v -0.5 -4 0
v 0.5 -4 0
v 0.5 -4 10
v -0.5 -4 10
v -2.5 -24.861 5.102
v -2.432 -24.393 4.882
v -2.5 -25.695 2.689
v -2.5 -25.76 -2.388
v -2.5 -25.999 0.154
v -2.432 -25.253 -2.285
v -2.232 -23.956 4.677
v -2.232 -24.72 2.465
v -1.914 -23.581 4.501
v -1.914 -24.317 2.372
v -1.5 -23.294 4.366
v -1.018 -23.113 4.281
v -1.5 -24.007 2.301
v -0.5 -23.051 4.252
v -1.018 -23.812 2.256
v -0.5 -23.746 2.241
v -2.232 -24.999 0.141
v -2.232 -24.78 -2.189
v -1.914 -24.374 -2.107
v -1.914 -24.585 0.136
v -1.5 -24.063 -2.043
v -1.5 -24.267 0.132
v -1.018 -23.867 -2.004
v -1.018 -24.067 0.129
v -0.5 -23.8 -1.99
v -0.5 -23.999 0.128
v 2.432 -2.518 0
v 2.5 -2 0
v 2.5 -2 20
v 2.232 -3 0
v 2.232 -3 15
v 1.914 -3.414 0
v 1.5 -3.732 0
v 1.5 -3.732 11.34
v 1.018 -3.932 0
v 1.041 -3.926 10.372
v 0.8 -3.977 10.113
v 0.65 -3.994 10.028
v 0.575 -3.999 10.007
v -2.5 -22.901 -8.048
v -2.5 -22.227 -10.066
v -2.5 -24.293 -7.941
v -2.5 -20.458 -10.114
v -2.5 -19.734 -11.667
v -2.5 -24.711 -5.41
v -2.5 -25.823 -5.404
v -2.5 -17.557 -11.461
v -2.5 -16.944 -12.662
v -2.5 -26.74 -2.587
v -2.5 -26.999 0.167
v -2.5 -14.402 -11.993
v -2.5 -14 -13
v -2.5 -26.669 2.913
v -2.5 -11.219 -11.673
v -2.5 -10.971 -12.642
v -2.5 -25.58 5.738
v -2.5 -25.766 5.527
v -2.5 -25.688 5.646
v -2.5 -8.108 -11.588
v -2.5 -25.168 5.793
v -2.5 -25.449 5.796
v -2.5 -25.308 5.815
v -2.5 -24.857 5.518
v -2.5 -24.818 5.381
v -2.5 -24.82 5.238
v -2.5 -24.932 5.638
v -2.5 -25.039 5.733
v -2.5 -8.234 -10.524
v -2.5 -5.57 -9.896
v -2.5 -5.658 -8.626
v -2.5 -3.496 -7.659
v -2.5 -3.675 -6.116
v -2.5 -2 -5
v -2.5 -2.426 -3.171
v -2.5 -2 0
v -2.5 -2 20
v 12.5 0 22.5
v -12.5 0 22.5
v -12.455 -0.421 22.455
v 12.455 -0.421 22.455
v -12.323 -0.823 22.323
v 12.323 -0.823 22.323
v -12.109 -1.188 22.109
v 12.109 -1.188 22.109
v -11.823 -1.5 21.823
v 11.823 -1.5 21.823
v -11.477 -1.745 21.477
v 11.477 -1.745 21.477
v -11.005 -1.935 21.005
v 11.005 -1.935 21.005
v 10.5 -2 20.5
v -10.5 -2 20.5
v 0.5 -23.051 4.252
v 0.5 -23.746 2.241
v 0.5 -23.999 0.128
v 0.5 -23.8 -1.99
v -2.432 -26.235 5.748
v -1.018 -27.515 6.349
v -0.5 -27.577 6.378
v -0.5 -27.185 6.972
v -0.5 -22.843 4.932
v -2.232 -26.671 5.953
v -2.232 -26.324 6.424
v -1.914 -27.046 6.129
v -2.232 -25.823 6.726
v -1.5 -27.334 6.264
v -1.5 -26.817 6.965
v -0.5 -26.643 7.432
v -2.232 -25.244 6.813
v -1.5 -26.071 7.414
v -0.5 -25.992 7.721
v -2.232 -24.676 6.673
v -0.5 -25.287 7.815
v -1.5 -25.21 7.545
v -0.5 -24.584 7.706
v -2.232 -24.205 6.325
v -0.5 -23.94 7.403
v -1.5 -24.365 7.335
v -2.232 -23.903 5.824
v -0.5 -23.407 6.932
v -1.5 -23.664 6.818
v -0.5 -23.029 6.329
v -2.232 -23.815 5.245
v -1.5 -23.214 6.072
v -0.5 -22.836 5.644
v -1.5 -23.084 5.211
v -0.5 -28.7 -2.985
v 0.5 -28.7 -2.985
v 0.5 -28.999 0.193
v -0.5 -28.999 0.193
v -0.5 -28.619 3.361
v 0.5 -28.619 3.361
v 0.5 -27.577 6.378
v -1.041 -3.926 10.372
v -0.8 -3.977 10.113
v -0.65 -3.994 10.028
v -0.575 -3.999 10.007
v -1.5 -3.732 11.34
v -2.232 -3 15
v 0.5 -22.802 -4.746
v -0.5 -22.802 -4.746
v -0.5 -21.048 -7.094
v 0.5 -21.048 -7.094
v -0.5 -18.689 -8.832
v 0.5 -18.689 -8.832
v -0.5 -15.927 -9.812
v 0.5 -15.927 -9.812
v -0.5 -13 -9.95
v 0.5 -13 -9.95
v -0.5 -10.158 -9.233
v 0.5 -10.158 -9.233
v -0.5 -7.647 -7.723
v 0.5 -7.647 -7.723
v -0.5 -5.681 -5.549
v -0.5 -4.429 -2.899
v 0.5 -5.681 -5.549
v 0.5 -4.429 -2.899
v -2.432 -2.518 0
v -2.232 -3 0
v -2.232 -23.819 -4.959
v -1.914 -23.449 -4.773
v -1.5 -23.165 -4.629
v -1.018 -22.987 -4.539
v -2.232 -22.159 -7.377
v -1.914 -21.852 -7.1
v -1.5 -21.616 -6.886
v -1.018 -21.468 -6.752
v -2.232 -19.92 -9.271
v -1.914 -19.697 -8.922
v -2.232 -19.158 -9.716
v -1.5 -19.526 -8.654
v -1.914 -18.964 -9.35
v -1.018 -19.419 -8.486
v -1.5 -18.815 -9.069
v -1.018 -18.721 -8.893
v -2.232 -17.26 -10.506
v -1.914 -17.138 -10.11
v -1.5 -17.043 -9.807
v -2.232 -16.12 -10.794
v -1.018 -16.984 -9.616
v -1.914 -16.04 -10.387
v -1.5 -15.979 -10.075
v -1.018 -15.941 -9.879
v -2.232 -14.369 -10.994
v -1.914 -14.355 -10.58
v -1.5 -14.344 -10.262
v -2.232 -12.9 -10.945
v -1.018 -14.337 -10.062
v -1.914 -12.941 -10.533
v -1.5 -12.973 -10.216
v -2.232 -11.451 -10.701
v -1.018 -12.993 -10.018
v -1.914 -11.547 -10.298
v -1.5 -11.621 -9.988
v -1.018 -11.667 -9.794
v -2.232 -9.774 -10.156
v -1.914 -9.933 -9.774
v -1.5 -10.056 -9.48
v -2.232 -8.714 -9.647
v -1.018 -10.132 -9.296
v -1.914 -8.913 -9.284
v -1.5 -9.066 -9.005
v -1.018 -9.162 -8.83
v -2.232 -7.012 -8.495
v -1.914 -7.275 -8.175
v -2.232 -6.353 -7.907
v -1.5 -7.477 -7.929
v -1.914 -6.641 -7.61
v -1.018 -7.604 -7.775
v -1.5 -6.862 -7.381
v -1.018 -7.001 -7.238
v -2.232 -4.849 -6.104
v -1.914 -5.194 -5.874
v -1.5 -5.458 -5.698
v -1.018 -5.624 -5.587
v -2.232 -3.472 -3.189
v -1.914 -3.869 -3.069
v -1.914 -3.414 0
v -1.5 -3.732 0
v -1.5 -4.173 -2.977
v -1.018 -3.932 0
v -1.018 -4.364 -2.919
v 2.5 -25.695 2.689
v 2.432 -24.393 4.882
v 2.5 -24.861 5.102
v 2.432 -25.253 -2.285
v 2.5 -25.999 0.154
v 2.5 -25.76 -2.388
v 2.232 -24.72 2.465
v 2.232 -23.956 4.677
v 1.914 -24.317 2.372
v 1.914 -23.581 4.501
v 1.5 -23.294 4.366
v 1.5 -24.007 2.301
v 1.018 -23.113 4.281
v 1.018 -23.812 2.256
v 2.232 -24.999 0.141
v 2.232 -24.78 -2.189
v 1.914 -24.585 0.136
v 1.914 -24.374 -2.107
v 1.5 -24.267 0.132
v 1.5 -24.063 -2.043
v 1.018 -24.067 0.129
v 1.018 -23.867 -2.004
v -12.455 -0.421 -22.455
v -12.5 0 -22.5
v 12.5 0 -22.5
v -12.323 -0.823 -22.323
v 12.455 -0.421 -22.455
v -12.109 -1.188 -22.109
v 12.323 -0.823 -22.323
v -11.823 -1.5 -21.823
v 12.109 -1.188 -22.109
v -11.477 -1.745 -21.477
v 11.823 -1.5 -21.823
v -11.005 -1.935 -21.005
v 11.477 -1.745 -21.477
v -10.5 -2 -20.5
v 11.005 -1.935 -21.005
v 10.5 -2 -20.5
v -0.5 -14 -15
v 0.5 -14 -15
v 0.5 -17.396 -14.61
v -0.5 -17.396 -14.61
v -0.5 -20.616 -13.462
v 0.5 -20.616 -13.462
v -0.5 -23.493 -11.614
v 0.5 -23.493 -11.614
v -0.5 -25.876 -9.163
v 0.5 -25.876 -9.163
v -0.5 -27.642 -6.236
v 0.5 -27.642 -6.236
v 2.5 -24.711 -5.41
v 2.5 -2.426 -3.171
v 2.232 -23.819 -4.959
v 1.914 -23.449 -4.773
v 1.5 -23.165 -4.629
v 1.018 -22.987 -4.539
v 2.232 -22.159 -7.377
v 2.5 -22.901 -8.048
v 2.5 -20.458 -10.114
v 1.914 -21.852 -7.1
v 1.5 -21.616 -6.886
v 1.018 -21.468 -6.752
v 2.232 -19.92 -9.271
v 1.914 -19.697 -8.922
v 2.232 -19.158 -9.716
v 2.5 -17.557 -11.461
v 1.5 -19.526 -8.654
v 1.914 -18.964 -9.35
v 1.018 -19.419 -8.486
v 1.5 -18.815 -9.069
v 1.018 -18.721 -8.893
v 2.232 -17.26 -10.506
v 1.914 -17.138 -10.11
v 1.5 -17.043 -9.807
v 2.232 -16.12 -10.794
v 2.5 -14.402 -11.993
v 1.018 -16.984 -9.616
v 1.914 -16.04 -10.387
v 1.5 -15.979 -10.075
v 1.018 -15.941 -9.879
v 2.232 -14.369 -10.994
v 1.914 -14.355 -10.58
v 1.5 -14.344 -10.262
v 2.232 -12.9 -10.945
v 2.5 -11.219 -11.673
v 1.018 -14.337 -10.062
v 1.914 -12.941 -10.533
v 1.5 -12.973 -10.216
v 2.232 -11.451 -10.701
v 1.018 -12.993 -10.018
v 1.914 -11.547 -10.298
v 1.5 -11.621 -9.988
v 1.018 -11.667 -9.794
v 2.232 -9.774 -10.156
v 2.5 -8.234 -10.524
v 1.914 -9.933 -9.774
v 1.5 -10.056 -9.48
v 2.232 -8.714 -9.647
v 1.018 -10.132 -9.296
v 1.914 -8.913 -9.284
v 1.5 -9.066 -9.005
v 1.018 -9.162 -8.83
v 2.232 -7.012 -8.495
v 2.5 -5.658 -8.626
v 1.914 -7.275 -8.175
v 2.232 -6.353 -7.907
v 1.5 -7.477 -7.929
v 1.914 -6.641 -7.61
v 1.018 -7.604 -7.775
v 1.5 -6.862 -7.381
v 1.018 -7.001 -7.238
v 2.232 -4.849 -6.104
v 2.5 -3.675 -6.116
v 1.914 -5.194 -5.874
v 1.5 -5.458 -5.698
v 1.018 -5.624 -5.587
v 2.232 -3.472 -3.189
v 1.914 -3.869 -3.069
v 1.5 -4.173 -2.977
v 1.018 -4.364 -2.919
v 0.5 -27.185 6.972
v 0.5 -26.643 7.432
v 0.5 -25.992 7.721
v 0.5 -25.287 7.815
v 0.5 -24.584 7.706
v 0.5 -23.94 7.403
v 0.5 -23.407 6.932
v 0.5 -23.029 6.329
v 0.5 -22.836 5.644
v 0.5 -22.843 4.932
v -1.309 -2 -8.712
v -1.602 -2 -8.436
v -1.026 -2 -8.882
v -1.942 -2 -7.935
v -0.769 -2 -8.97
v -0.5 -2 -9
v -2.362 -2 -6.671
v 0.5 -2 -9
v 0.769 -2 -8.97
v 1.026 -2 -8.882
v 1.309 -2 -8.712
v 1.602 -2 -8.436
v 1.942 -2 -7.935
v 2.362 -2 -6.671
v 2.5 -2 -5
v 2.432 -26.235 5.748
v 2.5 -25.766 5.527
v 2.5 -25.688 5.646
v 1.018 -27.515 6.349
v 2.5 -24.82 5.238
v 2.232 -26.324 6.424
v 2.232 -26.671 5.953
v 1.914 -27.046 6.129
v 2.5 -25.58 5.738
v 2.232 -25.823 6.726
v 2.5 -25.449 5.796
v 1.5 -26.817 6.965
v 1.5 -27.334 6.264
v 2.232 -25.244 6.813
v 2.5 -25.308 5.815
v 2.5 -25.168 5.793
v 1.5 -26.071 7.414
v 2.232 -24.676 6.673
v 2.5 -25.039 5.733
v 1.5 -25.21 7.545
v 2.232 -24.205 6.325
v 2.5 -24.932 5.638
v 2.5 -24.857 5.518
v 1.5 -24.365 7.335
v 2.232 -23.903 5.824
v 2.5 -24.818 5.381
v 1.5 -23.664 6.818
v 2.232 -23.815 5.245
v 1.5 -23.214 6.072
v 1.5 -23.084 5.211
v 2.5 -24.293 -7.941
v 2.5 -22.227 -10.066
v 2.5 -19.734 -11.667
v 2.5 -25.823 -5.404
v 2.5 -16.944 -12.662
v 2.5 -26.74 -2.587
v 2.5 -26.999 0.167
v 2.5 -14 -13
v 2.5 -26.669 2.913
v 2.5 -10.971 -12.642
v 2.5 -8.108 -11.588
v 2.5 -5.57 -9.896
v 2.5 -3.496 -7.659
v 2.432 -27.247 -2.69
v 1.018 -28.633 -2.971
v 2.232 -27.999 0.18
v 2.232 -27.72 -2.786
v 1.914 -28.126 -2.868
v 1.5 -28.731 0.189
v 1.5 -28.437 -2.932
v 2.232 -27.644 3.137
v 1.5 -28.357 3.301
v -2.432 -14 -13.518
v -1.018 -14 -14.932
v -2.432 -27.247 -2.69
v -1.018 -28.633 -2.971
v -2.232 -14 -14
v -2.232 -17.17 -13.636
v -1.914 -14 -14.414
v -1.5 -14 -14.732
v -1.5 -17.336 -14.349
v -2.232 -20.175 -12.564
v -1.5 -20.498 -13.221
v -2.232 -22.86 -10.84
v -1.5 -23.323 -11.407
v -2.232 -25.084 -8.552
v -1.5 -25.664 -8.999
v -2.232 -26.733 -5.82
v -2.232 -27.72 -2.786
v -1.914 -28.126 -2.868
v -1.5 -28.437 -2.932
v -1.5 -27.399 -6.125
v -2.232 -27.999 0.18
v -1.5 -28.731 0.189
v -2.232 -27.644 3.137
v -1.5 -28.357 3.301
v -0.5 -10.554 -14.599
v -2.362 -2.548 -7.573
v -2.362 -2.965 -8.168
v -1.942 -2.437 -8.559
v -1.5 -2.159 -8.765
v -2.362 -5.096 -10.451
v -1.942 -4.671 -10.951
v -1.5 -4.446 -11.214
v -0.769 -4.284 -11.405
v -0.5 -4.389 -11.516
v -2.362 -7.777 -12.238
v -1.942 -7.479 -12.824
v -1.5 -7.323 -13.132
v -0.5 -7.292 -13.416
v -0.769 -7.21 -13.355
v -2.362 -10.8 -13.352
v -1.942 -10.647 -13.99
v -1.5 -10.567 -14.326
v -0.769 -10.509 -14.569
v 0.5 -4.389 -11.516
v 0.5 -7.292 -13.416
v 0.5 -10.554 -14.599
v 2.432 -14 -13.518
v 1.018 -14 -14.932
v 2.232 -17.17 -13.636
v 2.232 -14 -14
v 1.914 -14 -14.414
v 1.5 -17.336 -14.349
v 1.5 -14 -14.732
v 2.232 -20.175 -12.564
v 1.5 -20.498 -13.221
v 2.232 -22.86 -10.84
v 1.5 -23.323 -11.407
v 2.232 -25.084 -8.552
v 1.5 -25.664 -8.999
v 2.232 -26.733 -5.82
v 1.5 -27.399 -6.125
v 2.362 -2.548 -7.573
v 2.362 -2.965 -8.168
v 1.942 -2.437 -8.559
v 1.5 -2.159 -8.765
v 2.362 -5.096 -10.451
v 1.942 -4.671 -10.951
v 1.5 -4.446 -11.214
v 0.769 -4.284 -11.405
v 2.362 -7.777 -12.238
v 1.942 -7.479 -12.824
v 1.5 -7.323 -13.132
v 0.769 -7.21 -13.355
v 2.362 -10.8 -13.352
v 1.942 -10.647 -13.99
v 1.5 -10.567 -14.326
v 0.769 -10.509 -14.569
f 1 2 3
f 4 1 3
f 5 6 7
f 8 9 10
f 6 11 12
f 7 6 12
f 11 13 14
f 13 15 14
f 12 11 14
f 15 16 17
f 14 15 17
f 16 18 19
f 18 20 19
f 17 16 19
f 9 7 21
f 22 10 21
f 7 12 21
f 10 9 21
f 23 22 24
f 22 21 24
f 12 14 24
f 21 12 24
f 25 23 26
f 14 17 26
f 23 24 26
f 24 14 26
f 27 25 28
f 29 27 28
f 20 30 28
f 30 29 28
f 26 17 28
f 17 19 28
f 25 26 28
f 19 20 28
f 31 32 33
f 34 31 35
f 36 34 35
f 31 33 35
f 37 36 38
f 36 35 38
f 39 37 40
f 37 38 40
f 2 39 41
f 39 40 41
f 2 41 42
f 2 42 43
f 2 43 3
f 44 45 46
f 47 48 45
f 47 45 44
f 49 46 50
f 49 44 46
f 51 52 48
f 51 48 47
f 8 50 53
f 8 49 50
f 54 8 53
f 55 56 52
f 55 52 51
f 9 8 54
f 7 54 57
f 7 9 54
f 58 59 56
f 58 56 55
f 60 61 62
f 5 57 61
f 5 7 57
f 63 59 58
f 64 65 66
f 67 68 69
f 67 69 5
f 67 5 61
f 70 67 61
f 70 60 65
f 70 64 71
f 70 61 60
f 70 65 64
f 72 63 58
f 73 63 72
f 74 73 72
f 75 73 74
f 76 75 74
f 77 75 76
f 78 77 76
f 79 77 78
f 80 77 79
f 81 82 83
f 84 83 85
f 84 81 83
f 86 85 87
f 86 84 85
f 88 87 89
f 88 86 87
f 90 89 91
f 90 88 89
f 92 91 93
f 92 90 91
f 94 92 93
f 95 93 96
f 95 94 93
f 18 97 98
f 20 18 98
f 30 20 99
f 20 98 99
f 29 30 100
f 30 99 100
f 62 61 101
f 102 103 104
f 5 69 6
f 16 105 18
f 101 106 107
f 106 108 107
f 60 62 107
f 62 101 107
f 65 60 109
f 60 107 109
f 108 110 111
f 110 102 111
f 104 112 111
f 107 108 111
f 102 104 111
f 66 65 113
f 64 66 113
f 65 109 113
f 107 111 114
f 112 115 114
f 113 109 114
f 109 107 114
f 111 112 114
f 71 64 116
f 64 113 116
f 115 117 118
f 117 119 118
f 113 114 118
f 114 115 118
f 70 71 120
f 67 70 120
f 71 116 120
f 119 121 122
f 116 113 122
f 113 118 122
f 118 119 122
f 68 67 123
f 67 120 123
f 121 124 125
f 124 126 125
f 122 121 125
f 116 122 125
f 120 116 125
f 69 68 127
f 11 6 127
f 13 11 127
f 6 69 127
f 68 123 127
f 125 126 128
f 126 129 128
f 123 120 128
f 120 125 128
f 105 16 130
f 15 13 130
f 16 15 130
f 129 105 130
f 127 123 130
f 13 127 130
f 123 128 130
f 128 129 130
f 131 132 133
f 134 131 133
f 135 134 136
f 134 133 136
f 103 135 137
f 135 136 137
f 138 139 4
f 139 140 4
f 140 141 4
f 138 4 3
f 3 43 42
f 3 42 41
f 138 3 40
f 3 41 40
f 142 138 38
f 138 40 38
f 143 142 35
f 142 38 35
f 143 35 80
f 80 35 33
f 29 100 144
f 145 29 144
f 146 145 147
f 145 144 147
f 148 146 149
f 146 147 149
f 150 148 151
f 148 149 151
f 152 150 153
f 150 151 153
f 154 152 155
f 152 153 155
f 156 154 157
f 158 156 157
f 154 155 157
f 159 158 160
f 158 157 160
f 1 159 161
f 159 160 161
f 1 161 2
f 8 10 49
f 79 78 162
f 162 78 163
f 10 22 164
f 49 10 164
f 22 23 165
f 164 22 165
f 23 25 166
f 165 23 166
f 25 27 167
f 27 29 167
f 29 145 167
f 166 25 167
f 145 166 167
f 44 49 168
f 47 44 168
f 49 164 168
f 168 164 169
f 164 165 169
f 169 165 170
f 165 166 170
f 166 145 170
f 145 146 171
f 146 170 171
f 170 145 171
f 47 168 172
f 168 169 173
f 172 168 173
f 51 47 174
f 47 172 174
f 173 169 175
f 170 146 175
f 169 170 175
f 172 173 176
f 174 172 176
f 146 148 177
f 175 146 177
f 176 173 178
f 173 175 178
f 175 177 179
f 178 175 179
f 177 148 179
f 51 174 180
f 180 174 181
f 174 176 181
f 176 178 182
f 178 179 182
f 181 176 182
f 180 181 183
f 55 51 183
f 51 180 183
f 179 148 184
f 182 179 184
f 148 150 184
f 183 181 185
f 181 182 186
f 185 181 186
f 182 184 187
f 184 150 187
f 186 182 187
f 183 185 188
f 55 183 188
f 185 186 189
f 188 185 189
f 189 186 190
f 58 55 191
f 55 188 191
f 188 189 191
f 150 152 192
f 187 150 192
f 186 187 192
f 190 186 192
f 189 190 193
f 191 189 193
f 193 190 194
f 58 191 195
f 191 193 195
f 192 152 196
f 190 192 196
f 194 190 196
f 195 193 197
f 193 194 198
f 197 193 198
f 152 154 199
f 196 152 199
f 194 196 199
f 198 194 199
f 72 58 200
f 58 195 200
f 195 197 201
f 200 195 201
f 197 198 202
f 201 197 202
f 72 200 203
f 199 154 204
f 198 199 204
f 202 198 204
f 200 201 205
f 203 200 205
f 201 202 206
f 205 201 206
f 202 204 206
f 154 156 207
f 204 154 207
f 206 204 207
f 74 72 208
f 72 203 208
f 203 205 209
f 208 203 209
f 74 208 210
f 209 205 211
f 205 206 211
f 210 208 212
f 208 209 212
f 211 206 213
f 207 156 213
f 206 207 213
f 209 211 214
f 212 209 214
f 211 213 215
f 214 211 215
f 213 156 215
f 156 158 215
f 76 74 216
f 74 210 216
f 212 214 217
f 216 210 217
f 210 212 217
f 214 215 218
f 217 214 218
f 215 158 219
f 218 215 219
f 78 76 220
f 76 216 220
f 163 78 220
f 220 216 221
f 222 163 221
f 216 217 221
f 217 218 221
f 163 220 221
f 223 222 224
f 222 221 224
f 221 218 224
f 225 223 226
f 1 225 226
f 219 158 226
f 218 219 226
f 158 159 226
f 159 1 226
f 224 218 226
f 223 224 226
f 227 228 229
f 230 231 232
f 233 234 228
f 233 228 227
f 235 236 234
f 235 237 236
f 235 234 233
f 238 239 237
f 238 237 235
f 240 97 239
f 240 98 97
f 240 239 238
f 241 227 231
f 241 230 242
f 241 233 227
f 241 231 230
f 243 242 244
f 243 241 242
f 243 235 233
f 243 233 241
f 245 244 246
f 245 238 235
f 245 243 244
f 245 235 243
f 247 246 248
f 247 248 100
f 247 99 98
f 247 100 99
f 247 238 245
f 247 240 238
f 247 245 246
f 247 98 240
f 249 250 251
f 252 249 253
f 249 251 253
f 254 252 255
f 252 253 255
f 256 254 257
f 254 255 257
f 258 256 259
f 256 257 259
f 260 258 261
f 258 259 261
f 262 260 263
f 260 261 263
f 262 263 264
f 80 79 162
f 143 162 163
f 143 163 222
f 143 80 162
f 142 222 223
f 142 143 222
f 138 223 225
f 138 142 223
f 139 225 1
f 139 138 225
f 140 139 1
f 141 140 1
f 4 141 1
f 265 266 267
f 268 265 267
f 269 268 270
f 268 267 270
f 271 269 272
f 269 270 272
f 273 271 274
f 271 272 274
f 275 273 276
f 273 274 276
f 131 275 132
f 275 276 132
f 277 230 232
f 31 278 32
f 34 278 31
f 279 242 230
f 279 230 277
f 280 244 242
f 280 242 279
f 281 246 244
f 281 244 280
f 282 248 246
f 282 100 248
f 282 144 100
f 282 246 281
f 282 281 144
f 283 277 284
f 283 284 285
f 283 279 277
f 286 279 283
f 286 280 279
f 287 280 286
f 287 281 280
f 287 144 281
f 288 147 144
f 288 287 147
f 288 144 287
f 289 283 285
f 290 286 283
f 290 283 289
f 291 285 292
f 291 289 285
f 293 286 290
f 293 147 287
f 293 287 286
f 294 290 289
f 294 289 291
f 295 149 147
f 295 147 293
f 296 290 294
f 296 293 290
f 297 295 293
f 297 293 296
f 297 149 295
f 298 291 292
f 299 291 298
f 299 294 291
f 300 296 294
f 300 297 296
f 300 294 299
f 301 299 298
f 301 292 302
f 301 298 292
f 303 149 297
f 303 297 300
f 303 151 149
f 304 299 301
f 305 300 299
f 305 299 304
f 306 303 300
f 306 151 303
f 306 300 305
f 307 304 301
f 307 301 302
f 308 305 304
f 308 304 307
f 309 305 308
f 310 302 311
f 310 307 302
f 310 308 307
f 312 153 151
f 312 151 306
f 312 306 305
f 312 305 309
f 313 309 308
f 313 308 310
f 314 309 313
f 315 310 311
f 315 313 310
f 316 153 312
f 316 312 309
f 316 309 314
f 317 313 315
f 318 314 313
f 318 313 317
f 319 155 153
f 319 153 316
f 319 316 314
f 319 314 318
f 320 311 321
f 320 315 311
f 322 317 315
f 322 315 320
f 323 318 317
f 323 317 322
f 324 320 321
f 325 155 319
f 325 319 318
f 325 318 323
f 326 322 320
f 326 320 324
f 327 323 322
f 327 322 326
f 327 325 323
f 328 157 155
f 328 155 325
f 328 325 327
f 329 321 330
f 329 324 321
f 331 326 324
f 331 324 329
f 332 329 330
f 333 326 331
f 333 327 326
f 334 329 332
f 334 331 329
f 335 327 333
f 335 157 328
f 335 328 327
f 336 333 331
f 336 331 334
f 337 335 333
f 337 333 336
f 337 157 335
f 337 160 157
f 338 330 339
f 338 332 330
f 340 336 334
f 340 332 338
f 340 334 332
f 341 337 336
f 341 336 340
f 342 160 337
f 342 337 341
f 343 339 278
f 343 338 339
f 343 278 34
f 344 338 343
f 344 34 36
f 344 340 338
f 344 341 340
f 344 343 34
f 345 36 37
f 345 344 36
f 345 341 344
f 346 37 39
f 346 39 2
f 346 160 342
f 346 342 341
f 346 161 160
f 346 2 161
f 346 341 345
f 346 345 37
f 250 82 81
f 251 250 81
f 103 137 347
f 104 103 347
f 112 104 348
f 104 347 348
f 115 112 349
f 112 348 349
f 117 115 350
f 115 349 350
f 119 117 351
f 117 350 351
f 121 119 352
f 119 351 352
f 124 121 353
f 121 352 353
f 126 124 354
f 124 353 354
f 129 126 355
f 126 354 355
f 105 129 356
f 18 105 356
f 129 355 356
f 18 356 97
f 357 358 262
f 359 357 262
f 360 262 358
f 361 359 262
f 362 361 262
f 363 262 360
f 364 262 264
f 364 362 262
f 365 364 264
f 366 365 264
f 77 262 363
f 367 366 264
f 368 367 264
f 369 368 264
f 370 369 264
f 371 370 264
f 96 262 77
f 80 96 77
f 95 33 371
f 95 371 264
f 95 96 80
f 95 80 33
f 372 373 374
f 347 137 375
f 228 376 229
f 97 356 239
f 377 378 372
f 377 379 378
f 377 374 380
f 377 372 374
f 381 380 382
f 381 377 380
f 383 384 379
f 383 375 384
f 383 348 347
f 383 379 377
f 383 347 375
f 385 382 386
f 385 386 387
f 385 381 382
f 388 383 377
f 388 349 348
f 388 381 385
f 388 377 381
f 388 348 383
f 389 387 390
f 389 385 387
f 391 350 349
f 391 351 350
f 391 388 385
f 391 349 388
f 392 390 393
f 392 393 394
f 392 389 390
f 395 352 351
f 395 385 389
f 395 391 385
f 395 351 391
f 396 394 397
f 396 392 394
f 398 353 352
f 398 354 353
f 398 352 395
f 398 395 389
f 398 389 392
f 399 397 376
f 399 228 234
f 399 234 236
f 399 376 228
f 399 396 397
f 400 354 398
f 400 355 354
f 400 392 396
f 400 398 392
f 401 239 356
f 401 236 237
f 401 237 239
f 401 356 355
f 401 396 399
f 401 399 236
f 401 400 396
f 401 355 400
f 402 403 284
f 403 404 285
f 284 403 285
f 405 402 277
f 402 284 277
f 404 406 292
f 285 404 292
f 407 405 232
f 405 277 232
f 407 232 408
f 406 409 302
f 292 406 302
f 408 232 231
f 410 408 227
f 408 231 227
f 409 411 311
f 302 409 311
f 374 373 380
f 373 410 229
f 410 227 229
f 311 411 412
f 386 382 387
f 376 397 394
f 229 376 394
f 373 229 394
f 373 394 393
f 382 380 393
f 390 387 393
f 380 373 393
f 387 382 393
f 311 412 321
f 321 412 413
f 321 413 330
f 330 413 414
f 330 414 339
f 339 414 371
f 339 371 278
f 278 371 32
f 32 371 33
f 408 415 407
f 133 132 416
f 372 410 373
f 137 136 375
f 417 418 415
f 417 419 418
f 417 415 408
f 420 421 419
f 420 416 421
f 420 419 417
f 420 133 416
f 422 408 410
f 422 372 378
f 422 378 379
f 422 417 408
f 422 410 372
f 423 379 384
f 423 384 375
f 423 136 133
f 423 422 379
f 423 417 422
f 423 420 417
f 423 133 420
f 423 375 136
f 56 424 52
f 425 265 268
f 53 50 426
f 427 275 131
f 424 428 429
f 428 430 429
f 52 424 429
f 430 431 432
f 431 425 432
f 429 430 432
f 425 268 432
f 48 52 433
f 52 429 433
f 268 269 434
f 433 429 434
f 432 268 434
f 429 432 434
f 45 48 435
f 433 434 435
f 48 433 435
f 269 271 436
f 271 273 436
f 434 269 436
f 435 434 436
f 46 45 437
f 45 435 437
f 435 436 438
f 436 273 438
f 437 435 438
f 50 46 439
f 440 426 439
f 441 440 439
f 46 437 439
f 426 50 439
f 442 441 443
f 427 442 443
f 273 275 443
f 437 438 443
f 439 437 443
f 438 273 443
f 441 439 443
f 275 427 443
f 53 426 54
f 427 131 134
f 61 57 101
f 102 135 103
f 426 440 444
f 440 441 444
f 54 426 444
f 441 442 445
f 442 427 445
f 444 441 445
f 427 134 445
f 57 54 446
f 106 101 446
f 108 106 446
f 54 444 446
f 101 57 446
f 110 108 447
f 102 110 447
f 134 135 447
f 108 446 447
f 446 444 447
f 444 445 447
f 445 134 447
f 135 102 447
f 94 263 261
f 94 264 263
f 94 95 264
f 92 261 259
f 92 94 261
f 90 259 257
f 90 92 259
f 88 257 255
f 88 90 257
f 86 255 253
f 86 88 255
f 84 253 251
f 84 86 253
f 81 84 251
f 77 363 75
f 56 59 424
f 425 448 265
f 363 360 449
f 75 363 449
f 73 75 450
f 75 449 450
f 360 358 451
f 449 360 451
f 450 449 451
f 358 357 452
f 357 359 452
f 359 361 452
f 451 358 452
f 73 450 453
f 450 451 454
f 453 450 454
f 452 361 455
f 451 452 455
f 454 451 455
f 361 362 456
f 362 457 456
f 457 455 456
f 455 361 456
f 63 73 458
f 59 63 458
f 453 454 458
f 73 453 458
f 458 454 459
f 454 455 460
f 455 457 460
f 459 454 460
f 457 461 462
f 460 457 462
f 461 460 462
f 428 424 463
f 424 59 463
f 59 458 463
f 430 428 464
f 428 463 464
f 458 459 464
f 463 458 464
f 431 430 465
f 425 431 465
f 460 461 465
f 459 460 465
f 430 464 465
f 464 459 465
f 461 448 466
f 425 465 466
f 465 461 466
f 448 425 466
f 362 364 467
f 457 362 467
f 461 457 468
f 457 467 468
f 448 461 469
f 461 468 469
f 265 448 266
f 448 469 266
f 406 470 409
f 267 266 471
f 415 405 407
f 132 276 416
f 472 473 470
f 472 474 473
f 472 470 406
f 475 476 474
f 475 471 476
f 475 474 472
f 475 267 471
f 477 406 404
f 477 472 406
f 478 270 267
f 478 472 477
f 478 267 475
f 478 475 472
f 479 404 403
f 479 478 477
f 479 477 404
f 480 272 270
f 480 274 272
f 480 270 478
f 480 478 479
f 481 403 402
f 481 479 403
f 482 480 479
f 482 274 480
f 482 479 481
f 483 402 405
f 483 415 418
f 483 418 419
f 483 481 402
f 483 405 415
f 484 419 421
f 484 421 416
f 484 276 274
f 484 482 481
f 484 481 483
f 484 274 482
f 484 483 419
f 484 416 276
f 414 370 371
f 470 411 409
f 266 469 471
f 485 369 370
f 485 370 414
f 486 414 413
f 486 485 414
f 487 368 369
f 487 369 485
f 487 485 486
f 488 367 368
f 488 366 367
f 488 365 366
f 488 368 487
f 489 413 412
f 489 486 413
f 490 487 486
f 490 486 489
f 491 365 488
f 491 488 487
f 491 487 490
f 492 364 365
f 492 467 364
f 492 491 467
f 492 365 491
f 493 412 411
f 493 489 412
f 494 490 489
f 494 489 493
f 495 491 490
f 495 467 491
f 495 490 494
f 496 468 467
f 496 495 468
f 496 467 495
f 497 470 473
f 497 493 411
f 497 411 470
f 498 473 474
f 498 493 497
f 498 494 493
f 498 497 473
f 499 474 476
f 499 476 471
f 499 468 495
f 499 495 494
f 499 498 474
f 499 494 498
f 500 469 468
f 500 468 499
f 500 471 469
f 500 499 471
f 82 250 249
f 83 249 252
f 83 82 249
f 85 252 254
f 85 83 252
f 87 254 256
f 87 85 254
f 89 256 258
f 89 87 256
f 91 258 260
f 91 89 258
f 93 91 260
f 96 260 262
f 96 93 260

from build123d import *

# Parameters (mm, degrees)
F0_W     = 25
F0_H     = 45
F1_DEPTH = 2
F2_W     = 5
F2_H     = 35
F3_DEPTH = 50
F5_DEPTH = 5
F6_R     = 1.99999


# Not quite as in the source:
# - a fillet or chamfer is up to 0.001 mm smaller than in the source, because OpenCascade refuses the exact size


with BuildPart() as f1:
    # F0 (on Front) → F1 (new body)
    with BuildSketch(Plane.XZ):
        Rectangle(F0_W, F0_H)
    extrude(amount=F1_DEPTH)

    # F2 (on face) → F3 (join)
    with BuildSketch(Plane.XZ.offset(2)):
        with Locations((0, 2.5)):
            Rectangle(F2_W, F2_H)
    extrude(amount=F3_DEPTH)

    # F4 (on face) → F5 (cut, through all)
    with BuildSketch(Plane.YZ.offset(2.5)):
        with BuildLine():
            Line((-4, 10), (-2, 20))
            Line((-2, 20), (-52, 20))
            Line((-52, 20), (-52, -15))
            Line((-52, -15), (-14.0000000101, -15))
            ThreePointArc((-14.0000000101, -15), (-23.4927752917, -11.6140956282), (-28.7, -2.9849623113))
            ThreePointArc((-28.7, -2.9849623113), (-28.8931709496, 1.7870252), (-27.5765596133, 6.3778545818))
            ThreePointArc((-27.5765596133, 6.3778545818), (-24.2508239141, 7.5776387537), (-23.0510397422, 4.2519030545))
            ThreePointArc((-23.0510397422, 4.2519030545), (-23.9287806331, 1.1913501333), (-23.8, -1.9899748742))
            ThreePointArc((-23.8, -1.9899748742), (-13, -9.9498743711), (-4, 0))
            Line((-4, 0), (-4, 10))
        make_face()
        with BuildLine():
            Line((-2, -15), (-2, -9))
            ThreePointArc((-2, -9), (-7.291796072, -13.4164078673), (-14.0000000101, -15))
            Line((-14.0000000101, -15), (-2, -15))
        make_face()
    extrude(amount=-F5_DEPTH, mode=Mode.SUBTRACT)

    # F6 (radius 2 in the source; OpenCascade refuses exactly that, so slightly less here)
    f6_edges = [f1.edges().sort_by_distance(p)[0] for p in [
        (2.5, -24.250824, 7.577639),
        (-2.5, -24.250824, 7.577639),
        (0, -2, 22.5),
        (-12.5, -2, 0),
        (0, -2, -22.5),
        (12.5, -2, 0),
    ]]
    fillet(f6_edges, radius=F6_R)


solid = f1.part
